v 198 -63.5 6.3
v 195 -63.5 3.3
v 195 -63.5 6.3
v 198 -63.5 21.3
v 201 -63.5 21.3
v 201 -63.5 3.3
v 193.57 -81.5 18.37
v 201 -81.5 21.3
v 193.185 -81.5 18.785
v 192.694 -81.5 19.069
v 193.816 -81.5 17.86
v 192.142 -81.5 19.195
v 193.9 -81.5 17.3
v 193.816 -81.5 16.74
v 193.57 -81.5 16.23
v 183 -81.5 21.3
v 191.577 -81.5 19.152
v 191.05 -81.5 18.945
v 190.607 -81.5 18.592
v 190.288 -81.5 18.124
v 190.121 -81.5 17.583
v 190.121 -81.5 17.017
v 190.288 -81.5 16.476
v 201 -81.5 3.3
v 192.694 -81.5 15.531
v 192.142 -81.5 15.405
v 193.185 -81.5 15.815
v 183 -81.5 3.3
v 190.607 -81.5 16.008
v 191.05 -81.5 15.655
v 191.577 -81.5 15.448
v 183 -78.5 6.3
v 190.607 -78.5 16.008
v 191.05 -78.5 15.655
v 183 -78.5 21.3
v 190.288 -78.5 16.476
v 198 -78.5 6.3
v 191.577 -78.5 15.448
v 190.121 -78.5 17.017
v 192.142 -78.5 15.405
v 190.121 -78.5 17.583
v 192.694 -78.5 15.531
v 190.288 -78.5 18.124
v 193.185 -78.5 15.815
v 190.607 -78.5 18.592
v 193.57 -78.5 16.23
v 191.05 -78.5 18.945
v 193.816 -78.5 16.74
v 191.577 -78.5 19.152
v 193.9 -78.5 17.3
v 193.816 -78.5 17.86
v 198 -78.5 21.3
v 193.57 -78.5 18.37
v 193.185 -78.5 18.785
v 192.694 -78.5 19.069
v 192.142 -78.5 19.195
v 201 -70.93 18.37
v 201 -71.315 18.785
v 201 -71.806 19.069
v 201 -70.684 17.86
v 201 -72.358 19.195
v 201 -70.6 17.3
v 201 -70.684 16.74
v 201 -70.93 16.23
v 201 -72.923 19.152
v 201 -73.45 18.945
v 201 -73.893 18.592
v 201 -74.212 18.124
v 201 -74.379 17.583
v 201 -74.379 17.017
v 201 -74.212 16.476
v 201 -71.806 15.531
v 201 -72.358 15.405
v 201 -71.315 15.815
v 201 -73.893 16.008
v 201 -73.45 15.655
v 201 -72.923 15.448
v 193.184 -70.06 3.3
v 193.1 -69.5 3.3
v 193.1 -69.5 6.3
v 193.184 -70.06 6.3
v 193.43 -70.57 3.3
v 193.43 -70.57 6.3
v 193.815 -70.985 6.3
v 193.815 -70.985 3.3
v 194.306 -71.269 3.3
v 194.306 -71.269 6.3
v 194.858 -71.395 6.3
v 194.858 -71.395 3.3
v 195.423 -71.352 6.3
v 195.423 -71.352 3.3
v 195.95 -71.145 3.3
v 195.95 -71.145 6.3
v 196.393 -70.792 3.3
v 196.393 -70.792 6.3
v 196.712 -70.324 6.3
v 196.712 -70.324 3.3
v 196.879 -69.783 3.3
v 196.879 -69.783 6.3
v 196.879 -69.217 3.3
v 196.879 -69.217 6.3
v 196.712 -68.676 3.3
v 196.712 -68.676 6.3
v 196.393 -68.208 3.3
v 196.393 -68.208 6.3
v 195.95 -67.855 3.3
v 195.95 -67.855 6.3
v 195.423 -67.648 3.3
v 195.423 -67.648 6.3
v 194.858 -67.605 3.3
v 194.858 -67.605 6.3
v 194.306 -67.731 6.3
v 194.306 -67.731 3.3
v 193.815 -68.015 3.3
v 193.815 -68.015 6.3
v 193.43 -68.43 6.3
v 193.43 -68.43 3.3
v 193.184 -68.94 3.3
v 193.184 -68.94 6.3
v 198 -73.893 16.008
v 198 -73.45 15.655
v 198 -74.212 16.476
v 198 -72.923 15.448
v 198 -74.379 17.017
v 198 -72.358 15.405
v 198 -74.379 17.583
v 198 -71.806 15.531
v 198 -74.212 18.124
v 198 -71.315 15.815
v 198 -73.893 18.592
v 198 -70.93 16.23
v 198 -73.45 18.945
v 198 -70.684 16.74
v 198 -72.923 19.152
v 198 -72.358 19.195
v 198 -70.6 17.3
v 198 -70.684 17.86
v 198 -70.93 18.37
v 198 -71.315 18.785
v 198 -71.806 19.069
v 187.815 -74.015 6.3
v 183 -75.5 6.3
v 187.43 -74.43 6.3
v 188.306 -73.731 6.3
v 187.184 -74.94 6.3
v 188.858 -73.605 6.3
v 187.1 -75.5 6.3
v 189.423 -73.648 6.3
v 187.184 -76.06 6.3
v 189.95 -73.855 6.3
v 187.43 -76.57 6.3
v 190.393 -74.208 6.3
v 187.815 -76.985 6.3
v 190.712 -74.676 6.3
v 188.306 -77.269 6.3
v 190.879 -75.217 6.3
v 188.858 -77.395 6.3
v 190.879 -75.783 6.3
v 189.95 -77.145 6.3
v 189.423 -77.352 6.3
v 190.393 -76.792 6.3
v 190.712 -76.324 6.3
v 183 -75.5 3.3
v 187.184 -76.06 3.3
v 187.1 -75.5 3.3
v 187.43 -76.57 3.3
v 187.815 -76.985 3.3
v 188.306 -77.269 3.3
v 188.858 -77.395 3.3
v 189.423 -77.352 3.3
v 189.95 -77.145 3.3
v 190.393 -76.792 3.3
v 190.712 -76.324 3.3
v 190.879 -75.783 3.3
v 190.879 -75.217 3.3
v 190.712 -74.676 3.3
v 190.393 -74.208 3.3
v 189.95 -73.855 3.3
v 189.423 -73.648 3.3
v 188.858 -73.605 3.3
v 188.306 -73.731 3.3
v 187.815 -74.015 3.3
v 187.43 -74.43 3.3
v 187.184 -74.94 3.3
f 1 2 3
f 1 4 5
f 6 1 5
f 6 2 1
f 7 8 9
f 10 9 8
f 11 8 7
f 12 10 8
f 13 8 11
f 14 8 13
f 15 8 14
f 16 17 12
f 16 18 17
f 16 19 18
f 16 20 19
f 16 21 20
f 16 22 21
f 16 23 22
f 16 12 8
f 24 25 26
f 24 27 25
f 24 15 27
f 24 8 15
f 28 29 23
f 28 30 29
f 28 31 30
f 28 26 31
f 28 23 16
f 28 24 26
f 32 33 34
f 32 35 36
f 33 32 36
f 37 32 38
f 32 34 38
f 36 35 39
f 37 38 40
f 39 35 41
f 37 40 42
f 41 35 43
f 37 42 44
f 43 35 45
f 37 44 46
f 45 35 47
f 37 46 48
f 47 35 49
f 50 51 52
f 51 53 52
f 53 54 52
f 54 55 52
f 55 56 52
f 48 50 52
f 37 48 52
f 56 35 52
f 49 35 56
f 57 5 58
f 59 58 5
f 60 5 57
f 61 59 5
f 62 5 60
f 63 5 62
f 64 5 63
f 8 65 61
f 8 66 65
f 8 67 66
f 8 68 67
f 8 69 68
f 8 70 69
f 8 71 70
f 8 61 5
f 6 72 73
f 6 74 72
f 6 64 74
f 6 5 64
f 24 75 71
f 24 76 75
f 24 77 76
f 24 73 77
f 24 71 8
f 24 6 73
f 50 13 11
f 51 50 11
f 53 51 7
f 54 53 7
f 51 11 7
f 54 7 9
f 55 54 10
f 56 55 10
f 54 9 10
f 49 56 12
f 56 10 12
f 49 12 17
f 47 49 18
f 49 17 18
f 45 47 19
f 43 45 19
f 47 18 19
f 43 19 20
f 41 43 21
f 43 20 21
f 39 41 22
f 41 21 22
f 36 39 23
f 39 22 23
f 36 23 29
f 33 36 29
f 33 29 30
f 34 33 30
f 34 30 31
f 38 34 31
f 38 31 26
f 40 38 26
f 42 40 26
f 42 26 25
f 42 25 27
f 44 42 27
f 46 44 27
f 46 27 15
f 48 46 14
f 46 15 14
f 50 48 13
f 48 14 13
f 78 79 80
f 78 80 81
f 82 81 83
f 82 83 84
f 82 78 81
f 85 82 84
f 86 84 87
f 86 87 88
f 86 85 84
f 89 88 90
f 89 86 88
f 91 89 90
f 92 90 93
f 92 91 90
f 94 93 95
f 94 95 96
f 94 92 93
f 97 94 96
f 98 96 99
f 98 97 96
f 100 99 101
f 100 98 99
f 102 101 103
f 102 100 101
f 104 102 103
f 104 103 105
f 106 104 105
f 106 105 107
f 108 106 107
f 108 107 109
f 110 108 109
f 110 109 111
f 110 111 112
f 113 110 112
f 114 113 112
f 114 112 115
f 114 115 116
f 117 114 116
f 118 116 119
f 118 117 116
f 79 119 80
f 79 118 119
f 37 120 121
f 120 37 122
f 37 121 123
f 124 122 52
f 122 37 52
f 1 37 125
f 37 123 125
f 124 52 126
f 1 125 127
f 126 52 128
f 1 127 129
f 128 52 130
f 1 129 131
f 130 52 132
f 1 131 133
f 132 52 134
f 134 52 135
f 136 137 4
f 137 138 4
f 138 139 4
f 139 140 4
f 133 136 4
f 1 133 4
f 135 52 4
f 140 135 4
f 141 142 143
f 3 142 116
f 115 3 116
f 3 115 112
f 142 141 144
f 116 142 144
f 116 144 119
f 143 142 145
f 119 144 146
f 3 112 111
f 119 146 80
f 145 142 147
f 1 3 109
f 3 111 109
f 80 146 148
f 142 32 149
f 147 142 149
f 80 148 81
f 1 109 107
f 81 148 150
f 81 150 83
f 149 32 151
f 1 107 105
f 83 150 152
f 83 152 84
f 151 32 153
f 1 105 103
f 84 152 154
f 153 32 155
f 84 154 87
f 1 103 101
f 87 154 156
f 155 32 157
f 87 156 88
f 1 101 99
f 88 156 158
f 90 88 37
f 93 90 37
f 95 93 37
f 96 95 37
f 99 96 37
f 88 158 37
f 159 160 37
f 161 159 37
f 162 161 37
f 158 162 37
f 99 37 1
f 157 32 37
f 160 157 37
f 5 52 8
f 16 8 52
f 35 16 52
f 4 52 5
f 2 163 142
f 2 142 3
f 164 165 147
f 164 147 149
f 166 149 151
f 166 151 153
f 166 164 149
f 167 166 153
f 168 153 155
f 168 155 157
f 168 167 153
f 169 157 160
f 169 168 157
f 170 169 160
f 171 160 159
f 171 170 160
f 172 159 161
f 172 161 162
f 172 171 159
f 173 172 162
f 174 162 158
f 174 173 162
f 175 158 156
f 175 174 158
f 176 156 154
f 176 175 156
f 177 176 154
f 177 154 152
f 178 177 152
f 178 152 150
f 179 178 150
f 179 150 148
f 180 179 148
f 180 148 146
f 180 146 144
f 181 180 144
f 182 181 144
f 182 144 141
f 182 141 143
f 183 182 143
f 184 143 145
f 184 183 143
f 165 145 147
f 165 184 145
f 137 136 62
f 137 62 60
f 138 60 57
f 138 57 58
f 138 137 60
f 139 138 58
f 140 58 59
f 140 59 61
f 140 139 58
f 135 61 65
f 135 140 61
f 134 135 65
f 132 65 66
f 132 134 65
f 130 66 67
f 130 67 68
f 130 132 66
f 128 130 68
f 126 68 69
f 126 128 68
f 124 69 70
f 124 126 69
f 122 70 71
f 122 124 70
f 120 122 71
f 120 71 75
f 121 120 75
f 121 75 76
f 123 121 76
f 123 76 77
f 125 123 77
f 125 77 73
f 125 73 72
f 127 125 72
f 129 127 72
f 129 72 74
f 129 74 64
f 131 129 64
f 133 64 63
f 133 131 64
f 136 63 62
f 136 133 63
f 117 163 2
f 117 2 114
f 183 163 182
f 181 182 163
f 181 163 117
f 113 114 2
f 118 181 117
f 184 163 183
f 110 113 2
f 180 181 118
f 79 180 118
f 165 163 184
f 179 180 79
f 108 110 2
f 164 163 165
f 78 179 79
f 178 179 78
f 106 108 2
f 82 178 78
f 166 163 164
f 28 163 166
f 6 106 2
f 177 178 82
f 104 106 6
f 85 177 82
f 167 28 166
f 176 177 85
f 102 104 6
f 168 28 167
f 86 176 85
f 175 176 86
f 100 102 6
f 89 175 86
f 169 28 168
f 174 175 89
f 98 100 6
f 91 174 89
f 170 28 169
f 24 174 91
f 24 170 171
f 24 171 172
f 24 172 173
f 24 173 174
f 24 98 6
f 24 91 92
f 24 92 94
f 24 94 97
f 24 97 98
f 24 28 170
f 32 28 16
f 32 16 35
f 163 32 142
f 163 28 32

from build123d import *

# Parameters (mm, degrees)
SKETCH009_R             = 1.9
PAD006_DEPTH            = 3
SKETCH010_W             = 18
SKETCH010_H             = 18
SKETCH010_R             = 1.9
PAD007_DEPTH            = 3
SKETCH011_W             = 18
SKETCH011_H             = 18
SKETCH011_R             = 1.9
PAD008_DEPTH            = 3
BODY008_PLACEMENT_ANGLE = 180


with BuildPart() as part:
    # Sketch009 → Pad006 (new body)
    with BuildSketch(Plane.XY):
        Polygon((0, -18), (0, 0), (18, 0), (18, -6), (6, -18), align=None)
        with Locations((6, -12)):
            Circle(SKETCH009_R, mode=Mode.SUBTRACT)
        with Locations((12, -6)):
            Circle(SKETCH009_R, mode=Mode.SUBTRACT)
    extrude(amount=PAD006_DEPTH)

    # Sketch010 (on Face1 of Pad006) → Pad007 (join)
    with BuildSketch(Plane(origin=(3, 0, 0), x_dir=(0, -1, 0), z_dir=(-1, 0, 0))):
        with Locations((9, 9)):
            Rectangle(SKETCH010_W, SKETCH010_H)
        with Locations((9, 14)):
            Circle(SKETCH010_R, mode=Mode.SUBTRACT)
    extrude(amount=PAD007_DEPTH)

    # Sketch011 (on Face2 of Pad006) → Pad008 (join)
    with BuildSketch(Plane(origin=(0, 0, 0), x_dir=(-1, 0, 0), z_dir=(0, 1, 0))):
        with Locations((-9, 9)):
            Rectangle(SKETCH011_W, SKETCH011_H)
        with Locations((-9, 14)):
            Circle(SKETCH011_R, mode=Mode.SUBTRACT)
    extrude(amount=-PAD008_DEPTH)


with BuildPart() as part_1:
    # Body005 placement: moved
    add(part.part.moved(Location((25, 0, 3.3))))


with BuildPart() as part_2:
    # Body008 placement: moved
    add(part_1.part.moved(Location((226, -81.5, 0))).rotate(Axis((226, -81.5, 0), (0, 0, 1)), BODY008_PLACEMENT_ANGLE))


solid = part_2.part
